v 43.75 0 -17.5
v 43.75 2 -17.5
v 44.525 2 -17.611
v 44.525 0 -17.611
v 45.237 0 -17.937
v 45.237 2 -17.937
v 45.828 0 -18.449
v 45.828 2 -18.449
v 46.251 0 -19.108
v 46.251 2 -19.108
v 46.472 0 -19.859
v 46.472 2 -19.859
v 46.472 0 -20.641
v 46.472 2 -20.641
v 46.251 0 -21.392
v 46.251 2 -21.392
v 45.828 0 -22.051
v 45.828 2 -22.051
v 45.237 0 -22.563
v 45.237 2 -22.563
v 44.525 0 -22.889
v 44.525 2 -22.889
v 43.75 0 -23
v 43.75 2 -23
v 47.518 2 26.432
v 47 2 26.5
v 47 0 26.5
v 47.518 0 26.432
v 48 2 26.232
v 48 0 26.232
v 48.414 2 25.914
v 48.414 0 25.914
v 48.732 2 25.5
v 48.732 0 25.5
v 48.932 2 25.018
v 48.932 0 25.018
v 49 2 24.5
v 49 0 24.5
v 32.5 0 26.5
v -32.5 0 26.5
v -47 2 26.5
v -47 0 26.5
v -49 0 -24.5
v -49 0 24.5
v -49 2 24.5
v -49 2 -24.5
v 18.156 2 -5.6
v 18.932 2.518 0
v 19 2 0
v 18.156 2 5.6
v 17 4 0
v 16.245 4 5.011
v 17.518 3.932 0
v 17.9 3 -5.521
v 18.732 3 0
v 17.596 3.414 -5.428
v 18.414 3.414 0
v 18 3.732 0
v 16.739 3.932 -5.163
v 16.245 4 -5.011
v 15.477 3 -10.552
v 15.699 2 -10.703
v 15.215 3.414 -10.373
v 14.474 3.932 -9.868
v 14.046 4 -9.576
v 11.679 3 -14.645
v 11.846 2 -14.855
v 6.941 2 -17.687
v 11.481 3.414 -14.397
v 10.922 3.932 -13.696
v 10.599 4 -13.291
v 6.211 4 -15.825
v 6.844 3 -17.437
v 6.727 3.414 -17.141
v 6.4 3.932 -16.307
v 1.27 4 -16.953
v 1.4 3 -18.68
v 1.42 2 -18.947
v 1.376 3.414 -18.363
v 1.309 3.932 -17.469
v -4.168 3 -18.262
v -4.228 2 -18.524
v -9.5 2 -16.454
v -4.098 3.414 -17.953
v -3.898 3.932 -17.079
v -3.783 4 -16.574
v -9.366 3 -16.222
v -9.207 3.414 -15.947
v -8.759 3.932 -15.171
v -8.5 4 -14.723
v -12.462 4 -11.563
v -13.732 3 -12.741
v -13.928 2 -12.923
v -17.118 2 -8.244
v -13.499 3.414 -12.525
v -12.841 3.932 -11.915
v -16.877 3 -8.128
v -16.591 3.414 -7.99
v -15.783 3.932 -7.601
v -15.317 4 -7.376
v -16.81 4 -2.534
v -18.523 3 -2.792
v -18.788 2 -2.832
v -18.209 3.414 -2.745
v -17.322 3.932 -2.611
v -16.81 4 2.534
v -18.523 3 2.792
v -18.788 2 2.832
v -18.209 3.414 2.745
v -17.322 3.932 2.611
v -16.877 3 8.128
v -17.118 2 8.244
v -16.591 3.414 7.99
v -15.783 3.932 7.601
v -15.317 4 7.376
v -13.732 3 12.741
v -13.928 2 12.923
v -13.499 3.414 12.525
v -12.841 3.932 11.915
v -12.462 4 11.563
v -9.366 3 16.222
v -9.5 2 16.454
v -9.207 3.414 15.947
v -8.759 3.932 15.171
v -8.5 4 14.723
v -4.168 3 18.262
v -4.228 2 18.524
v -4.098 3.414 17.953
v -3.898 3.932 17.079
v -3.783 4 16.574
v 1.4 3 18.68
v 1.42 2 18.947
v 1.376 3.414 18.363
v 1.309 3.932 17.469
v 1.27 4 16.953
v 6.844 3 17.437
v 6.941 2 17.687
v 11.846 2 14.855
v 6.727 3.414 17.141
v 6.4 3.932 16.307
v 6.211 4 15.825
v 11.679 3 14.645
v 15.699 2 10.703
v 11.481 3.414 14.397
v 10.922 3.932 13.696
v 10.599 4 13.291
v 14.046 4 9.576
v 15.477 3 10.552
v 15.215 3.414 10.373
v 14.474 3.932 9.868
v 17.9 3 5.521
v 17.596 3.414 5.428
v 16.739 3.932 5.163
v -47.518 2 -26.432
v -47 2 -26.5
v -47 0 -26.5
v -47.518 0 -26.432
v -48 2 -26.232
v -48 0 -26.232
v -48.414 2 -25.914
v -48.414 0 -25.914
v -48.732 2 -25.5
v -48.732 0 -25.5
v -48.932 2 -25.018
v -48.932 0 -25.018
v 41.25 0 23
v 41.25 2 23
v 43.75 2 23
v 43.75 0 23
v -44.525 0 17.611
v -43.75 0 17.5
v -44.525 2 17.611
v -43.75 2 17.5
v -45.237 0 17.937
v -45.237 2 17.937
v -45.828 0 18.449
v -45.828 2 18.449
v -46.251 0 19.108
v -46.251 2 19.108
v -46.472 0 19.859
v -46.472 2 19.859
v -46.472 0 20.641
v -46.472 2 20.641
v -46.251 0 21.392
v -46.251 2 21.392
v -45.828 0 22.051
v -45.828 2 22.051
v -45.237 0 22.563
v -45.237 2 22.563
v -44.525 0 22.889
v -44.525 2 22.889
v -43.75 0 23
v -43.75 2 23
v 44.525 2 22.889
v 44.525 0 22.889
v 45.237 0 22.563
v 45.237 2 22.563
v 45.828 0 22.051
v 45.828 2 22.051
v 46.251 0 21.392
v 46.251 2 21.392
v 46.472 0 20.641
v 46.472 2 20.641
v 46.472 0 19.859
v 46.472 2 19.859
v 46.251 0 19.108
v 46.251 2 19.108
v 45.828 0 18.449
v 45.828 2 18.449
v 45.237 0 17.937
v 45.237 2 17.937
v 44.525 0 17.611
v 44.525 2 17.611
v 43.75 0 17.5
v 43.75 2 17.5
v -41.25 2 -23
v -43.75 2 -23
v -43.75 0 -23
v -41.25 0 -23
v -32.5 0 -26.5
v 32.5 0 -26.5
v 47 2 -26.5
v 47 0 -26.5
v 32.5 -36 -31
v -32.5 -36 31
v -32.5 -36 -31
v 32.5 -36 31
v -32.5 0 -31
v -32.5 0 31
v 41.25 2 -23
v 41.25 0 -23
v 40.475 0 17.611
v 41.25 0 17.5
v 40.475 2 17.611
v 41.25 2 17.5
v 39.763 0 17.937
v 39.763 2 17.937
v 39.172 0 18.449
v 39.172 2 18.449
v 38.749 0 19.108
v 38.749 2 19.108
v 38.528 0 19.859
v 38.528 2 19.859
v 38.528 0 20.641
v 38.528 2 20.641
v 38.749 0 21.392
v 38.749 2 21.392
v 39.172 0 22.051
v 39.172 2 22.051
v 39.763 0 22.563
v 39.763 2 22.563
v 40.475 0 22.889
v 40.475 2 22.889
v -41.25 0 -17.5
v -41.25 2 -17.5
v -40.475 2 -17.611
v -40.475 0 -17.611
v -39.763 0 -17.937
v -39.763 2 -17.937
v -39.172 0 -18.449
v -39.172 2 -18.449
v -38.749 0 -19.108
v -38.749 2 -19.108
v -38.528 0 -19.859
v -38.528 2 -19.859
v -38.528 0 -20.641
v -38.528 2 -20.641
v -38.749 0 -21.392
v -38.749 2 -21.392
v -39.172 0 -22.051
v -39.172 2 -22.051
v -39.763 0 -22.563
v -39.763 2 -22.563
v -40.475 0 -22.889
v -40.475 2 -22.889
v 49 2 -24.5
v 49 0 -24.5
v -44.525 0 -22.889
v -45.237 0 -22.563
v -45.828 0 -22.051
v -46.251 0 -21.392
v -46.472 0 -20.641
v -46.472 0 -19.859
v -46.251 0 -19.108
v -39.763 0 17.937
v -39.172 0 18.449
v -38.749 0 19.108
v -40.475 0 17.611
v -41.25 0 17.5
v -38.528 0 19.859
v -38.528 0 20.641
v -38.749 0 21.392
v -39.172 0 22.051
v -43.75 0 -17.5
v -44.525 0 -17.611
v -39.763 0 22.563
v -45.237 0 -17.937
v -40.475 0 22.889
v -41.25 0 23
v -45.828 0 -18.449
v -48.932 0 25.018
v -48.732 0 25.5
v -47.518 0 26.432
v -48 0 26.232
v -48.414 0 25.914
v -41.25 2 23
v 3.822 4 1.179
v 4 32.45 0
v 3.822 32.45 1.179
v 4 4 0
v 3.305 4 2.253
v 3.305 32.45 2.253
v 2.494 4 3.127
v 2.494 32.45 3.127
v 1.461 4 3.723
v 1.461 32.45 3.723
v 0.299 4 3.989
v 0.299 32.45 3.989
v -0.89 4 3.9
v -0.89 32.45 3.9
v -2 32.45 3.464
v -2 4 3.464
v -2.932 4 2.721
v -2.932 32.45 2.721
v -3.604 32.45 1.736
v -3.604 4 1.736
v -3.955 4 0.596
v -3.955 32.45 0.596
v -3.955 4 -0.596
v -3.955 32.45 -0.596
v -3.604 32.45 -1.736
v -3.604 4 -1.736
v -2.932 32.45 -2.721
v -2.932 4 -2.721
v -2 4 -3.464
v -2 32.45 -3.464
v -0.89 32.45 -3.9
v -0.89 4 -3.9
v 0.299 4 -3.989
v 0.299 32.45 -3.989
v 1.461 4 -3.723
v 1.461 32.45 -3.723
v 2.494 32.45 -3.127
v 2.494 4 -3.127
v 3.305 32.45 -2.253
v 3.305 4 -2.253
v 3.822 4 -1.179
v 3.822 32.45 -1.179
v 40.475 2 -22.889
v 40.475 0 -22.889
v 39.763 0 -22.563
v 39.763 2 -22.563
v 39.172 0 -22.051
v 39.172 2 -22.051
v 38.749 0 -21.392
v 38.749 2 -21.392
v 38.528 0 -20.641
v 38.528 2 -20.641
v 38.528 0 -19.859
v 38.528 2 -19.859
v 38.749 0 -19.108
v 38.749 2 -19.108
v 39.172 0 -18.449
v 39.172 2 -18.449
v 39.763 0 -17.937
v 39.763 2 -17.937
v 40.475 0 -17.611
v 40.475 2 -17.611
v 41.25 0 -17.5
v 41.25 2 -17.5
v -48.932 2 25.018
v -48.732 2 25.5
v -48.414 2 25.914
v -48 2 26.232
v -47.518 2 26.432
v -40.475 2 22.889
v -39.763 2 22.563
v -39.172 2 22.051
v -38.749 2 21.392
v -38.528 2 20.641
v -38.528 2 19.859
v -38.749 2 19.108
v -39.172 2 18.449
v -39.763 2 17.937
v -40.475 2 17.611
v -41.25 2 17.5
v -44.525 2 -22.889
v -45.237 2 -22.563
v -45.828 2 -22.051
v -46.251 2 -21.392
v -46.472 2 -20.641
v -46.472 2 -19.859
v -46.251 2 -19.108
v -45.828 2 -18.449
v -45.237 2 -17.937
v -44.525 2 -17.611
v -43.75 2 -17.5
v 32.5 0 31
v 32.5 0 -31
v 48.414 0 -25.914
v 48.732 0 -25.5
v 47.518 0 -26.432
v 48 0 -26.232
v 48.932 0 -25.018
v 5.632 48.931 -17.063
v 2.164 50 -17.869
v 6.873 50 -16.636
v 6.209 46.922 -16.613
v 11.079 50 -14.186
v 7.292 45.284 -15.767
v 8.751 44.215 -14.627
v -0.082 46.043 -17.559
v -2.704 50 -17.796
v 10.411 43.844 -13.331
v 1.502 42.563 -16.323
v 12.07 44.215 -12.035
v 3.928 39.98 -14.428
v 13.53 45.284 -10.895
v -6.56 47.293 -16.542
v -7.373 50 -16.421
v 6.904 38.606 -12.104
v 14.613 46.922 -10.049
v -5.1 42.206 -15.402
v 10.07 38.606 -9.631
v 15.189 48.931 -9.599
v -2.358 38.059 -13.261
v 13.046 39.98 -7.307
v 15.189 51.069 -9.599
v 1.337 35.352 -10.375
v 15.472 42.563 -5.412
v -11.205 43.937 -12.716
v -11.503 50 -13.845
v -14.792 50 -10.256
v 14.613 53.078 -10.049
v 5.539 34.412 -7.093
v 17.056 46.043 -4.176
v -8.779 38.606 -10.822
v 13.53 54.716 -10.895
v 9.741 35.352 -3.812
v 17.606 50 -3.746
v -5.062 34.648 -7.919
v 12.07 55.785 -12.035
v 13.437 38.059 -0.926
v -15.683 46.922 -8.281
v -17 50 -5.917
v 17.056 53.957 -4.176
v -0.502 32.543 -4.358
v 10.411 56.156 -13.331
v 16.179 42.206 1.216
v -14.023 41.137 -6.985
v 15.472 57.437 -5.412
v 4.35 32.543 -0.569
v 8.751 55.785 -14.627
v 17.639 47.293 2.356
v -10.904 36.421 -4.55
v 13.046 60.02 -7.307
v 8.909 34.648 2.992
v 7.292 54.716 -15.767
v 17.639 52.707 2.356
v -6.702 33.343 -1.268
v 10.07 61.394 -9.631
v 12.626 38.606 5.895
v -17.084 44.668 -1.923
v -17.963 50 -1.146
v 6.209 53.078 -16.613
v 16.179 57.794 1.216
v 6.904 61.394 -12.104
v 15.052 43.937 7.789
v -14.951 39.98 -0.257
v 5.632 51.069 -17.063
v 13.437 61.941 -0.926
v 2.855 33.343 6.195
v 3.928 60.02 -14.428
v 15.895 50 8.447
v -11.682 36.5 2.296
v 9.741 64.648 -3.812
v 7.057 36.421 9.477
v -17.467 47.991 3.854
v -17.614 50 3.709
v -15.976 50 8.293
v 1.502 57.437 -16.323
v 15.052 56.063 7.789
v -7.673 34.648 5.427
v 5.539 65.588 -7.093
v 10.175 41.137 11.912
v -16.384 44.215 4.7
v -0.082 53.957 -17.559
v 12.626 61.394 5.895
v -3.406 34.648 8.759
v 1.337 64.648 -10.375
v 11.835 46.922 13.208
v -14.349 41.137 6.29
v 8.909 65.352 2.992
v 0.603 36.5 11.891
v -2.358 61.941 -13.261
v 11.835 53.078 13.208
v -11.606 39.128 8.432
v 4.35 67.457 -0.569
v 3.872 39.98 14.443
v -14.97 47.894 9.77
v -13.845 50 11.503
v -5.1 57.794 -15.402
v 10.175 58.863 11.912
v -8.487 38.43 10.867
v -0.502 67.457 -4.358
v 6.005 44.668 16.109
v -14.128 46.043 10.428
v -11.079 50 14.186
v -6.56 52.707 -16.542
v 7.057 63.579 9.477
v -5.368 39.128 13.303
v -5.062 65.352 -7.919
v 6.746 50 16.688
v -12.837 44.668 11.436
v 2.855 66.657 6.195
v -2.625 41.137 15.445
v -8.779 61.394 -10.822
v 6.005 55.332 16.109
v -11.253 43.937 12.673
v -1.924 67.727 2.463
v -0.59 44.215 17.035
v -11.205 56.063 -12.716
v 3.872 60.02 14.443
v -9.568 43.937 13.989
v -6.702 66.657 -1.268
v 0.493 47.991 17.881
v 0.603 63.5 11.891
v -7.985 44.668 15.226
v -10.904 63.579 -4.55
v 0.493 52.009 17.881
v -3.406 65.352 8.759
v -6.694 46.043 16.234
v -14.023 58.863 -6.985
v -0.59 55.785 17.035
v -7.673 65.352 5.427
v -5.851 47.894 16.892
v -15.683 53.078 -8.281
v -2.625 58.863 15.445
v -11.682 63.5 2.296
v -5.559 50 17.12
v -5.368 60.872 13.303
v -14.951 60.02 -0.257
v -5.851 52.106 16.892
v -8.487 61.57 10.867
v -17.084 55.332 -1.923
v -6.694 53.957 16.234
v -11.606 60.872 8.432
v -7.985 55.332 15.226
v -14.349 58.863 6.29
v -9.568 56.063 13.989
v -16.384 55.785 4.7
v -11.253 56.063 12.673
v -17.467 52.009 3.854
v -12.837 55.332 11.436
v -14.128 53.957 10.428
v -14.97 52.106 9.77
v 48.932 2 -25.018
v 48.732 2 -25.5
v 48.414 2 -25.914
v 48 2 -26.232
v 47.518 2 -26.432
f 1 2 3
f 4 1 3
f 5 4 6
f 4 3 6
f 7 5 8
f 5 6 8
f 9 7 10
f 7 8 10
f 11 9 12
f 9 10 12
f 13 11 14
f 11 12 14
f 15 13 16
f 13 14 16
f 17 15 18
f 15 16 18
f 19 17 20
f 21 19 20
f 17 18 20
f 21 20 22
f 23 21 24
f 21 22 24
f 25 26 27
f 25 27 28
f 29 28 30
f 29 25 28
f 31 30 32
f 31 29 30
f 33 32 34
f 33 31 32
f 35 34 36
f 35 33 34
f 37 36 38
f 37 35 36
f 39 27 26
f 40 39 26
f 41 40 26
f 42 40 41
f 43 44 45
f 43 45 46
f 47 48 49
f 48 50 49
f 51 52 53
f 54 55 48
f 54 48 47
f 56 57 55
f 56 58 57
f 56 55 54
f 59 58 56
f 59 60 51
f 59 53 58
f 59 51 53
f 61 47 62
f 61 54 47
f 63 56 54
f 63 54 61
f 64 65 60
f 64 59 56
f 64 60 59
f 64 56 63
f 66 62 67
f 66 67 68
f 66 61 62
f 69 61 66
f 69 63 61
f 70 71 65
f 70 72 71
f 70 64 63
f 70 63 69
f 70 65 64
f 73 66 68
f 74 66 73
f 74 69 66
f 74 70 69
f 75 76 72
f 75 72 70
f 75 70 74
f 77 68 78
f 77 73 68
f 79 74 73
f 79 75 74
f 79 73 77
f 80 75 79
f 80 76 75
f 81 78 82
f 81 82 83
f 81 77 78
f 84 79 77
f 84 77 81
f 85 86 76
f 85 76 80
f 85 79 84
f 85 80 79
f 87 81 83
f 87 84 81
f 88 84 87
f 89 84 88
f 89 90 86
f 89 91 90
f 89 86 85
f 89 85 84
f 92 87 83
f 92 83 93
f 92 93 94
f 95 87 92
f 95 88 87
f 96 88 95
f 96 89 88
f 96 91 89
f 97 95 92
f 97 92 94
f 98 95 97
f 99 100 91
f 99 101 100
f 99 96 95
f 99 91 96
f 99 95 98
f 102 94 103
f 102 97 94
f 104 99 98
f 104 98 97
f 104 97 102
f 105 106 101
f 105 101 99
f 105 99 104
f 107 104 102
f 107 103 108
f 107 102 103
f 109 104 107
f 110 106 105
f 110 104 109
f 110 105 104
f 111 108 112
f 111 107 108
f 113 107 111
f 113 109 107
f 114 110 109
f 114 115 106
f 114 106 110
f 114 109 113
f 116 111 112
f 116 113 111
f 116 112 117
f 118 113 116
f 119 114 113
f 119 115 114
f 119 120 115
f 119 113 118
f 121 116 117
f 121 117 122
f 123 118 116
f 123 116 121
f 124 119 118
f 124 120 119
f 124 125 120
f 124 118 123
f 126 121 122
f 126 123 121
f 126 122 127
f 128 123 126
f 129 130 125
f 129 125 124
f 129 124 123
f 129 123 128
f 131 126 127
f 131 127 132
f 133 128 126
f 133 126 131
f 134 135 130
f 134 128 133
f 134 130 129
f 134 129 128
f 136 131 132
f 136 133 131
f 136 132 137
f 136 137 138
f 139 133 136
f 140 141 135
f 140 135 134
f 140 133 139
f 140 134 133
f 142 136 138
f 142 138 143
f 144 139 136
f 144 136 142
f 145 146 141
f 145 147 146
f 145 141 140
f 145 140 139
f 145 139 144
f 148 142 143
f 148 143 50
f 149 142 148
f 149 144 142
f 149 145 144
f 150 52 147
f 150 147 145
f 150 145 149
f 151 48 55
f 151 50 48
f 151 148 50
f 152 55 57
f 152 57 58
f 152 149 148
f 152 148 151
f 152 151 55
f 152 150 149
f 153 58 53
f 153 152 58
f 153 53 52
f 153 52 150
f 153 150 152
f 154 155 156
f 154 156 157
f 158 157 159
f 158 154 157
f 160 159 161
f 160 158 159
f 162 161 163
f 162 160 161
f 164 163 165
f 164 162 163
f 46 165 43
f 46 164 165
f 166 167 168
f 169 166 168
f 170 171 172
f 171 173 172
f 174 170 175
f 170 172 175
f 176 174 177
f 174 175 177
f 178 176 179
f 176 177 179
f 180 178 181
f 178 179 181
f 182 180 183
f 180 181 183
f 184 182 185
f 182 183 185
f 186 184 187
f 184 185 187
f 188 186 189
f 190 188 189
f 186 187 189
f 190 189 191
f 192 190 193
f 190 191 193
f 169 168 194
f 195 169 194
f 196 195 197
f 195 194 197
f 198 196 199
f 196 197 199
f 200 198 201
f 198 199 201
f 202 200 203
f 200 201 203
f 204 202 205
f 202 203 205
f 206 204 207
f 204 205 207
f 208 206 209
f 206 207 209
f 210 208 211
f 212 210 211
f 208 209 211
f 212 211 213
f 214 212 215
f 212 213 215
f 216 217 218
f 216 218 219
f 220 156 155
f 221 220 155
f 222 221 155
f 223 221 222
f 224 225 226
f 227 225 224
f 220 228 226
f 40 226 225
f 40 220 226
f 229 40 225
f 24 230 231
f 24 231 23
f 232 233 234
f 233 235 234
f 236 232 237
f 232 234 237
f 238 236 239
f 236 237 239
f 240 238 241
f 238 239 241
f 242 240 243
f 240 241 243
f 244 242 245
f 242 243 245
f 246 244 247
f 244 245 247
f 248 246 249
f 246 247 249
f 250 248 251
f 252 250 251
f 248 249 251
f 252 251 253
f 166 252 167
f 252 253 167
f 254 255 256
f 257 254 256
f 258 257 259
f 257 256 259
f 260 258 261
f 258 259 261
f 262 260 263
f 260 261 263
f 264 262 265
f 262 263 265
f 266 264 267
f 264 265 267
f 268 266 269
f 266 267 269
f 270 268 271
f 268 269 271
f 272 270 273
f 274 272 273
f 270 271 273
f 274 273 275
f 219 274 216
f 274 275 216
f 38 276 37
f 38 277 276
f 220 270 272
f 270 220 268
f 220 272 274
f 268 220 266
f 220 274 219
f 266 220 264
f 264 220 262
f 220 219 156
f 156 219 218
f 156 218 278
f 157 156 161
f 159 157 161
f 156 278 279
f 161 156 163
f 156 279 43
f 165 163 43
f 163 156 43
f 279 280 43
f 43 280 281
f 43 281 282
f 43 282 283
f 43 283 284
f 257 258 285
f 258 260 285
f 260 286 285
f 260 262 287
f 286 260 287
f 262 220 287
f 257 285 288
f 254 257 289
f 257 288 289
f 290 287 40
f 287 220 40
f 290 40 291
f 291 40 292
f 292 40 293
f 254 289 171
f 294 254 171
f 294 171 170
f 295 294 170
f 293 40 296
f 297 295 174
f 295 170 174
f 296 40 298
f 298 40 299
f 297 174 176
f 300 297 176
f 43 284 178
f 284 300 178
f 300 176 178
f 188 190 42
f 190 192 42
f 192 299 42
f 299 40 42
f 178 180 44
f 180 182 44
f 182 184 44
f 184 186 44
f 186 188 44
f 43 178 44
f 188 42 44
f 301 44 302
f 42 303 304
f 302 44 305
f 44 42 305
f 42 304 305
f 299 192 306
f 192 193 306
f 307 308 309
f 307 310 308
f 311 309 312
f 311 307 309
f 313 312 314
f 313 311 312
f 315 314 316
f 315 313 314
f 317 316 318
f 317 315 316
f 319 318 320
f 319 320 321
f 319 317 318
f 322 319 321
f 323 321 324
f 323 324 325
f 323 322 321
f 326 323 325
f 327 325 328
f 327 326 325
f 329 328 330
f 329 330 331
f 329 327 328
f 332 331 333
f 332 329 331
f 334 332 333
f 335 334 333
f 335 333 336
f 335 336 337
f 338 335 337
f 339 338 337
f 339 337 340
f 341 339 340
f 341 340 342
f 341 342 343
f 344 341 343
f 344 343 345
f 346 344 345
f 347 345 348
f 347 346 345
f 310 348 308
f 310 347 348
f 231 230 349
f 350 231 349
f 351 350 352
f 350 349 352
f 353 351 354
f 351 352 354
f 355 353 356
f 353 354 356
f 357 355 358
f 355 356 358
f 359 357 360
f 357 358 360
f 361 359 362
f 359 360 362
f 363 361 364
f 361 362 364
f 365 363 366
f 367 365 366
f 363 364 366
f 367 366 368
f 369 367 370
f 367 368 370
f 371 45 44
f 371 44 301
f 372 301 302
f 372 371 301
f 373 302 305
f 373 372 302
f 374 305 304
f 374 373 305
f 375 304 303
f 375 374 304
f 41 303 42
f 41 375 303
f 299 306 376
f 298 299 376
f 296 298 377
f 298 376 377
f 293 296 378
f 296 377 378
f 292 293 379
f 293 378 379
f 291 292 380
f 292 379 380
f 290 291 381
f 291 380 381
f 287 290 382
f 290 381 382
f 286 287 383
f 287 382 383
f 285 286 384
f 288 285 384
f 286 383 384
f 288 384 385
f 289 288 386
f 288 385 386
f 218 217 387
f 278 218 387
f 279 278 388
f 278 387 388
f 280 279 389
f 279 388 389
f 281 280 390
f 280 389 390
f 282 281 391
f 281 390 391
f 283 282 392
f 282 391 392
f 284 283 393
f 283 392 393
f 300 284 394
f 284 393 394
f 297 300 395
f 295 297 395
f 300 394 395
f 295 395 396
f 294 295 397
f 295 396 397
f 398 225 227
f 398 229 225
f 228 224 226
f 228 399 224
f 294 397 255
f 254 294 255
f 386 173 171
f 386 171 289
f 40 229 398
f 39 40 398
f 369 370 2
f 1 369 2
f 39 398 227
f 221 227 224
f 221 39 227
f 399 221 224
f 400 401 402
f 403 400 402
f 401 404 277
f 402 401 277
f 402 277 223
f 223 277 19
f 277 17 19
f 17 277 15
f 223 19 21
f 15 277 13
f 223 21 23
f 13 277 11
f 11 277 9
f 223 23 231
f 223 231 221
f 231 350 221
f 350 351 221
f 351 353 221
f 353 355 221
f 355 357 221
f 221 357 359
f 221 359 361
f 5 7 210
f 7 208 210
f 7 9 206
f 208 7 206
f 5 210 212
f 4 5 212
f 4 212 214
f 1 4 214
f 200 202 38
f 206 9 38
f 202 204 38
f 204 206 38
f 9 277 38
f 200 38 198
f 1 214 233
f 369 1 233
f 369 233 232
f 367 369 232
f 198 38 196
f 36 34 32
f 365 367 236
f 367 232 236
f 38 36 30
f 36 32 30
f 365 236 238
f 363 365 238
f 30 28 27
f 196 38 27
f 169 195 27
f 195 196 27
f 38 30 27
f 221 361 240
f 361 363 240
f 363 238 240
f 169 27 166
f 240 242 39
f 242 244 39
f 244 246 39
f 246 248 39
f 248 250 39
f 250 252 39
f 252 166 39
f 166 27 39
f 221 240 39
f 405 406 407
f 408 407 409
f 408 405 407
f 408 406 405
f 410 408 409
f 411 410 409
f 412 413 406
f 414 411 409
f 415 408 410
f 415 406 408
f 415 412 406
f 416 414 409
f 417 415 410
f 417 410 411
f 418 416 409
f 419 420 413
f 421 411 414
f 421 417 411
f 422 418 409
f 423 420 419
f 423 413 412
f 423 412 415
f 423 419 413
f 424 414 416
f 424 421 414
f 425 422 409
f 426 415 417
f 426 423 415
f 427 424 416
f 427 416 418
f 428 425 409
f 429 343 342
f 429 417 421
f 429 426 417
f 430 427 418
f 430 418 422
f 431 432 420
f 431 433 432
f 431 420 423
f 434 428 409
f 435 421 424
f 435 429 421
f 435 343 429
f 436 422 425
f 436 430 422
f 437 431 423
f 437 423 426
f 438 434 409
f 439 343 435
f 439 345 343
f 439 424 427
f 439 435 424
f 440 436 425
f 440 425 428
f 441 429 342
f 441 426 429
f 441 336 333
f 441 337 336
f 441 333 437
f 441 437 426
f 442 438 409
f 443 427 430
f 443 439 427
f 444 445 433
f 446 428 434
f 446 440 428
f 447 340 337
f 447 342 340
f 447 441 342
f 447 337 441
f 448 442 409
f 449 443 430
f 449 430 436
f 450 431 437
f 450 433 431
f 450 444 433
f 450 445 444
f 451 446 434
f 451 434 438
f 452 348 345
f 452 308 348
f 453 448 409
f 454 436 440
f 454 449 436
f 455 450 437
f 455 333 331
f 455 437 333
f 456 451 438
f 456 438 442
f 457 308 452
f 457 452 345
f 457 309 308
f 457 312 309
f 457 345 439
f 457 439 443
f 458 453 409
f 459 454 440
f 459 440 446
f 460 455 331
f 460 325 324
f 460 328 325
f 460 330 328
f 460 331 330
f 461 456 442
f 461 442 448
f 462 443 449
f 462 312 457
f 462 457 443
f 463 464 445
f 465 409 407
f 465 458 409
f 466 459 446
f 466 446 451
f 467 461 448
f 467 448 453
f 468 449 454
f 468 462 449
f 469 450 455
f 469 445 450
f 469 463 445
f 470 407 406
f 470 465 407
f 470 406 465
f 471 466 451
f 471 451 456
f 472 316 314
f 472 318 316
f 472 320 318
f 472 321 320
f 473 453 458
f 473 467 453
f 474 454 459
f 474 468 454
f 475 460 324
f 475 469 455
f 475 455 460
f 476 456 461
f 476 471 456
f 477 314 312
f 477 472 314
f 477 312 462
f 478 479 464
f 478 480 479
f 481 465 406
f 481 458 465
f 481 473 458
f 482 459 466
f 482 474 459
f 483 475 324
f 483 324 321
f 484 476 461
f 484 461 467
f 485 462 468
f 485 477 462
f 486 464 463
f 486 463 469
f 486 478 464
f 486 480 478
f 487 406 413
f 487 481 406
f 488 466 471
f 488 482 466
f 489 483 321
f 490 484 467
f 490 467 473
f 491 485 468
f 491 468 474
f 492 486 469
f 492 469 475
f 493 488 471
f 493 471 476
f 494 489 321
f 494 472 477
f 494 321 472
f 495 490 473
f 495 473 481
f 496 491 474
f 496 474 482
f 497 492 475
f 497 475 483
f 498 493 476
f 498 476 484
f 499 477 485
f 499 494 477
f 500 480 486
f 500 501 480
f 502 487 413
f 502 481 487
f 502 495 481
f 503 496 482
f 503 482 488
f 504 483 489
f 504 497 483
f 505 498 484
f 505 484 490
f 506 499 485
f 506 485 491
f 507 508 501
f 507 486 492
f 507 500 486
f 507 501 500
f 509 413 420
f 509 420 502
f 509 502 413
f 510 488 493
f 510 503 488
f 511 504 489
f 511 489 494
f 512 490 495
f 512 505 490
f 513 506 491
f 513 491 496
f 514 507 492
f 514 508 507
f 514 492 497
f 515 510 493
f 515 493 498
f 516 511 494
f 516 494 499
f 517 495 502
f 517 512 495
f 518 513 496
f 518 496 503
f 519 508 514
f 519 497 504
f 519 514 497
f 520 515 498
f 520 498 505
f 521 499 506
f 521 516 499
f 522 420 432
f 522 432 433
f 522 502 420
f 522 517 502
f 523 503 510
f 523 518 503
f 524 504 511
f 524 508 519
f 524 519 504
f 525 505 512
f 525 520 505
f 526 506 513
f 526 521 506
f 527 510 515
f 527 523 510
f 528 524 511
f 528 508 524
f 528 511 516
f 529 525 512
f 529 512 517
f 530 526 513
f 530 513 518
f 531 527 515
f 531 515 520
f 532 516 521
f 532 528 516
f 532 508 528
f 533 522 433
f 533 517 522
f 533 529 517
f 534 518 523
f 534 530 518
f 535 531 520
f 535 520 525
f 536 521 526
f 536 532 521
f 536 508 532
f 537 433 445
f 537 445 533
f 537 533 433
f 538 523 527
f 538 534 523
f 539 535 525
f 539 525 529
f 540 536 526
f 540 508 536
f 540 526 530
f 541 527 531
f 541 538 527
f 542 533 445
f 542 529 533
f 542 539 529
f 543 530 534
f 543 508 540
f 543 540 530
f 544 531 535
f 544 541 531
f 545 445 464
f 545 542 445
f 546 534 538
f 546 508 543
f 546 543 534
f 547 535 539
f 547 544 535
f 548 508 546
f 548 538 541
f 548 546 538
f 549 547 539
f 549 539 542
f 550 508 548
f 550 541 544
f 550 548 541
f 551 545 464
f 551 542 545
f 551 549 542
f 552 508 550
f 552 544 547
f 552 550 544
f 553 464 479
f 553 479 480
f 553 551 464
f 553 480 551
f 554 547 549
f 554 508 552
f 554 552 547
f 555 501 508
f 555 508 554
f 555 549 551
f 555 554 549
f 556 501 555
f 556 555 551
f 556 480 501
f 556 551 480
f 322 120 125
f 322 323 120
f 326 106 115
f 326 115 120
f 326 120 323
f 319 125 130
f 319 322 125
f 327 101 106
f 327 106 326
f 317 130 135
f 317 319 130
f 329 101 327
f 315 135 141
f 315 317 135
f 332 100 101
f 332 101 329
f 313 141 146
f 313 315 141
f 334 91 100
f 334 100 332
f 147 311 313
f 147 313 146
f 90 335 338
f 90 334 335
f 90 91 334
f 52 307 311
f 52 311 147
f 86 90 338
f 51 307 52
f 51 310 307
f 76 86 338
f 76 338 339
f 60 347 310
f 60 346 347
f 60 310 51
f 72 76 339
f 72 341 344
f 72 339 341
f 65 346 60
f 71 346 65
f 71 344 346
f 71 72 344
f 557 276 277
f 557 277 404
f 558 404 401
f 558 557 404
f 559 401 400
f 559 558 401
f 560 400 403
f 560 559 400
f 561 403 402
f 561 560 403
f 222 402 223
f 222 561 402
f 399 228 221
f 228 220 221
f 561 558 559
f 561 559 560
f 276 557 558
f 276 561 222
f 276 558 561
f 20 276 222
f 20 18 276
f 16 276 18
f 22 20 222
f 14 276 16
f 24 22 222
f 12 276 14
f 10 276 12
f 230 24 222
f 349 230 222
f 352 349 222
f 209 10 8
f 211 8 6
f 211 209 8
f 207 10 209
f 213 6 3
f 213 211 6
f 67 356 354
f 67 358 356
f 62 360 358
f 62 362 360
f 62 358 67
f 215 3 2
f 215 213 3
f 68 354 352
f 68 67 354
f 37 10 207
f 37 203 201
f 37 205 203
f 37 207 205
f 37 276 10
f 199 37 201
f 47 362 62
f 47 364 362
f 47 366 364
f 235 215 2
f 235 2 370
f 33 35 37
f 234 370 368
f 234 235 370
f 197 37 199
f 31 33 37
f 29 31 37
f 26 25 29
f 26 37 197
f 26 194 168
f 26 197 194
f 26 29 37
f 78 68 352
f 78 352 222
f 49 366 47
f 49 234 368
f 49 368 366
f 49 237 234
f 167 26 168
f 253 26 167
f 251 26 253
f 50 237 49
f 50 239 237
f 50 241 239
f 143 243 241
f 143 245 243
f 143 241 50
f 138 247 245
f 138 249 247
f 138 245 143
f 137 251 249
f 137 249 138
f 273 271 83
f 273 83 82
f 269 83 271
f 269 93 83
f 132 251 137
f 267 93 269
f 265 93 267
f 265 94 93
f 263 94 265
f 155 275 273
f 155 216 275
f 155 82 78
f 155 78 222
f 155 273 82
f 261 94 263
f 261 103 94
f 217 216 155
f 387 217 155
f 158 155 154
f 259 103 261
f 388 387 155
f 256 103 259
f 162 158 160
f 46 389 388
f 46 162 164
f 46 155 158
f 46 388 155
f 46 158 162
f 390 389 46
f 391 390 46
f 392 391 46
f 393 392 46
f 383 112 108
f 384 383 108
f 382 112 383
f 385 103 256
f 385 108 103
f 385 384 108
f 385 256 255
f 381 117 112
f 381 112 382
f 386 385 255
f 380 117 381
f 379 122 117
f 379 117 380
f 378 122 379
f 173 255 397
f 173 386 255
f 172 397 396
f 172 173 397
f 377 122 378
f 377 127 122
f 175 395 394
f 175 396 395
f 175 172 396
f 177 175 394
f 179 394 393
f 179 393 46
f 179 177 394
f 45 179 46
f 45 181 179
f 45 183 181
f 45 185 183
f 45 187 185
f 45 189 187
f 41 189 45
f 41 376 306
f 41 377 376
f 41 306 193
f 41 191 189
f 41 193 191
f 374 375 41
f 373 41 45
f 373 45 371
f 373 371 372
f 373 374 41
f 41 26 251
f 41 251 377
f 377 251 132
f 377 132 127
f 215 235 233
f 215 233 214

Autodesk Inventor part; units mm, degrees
ref_plane "YZ Plane" through (0, 0, 0) normal (1, 0, 0) x (0, 1, 0)
ref_plane "XZ Plane" through (0, 0, 0) normal (0, 1, 0) x (-1, 0, 0)
ref_plane "XY Plane" through (0, 0, 0) normal (0, 0, 1) x (1, 0, 0)
sketch "Sketch2" plane through (0, 0, 0) normal (0, 1, 0) x (-1, 0, 0)
  line L0 (-49, 26.5) -> (49, 26.5)
  line L1 (49, 26.5) -> (49, -26.5)
  line L2 (49, -26.5) -> (-49, -26.5)
  line L3 (-49, -26.5) -> (-49, 26.5)
  point P0 (0, 0)
  point P1 (0, -26.5)
  point P2 (49, 0)
  dimension "d5" = 98
  dimension "d7" = 53
extrude "Extrusion1" add sketch "Sketch2" along normal blind 2
sketch "Sketch3" plane through (0, 2, 0) normal (0, 1, 0) x (1, 0, 0)
  line L0 (-49, -26.5) -> (49, -26.5) projected
  line L1 (49, -26.5) -> (49, 26.5) projected
  line L2 (49, 26.5) -> (-49, 26.5) projected
  line L3 (-49, 26.5) -> (-49, -26.5) projected
  arc A0 (43.75, 17.5) -> (43.75, 23) centre (43.75, 20.25) ccw
  arc A1 (41.25, 23) -> (41.25, 17.5) centre (41.25, 20.25) ccw
  line L4 (41.25, 23) -> (43.75, 23)
  line L5 (41.25, 17.5) -> (43.75, 17.5)
  arc A2 (-41.25, 17.5) -> (-41.25, 23) centre (-41.25, 20.25) ccw
  arc A3 (-43.75, 23) -> (-43.75, 17.5) centre (-43.75, 20.25) ccw
  line L6 (-43.75, 23) -> (-41.25, 23)
  line L7 (-43.75, 17.5) -> (-41.25, 17.5)
  arc A4 (43.75, -23) -> (43.75, -17.5) centre (43.75, -20.25) ccw
  arc A5 (41.25, -17.5) -> (41.25, -23) centre (41.25, -20.25) ccw
  line L8 (41.25, -17.5) -> (43.75, -17.5)
  line L9 (41.25, -23) -> (43.75, -23)
  arc A6 (-41.25, -23) -> (-41.25, -17.5) centre (-41.25, -20.25) ccw
  arc A7 (-43.75, -17.5) -> (-43.75, -23) centre (-43.75, -20.25) ccw
  line L10 (-43.75, -17.5) -> (-41.25, -17.5)
  line L11 (-43.75, -23) -> (-41.25, -23)
  point P0 (0, 0)
  dimension "d10" = 5.5
  dimension "d13" = 2.5
  dimension "d14" = 20.25
  dimension "d15" = 41.25
  dimension "d20" = 85
  dimension "d23" = 40.5
extrude "Extrusion4" cut sketch "Sketch3" against normal blind 2 keep common part
sketch "Sketch4" plane through (0, 2, 0) normal (0, 1, 0) x (1, 0, 0)
  circle A0 centre (0, 0) radius 19
  dimension "d30" = 38
extrude "Extrusion5" add sketch "Sketch4" along normal blind 2
sketch "Sketch5" plane through (0, 4, 0) normal (0, 1, 0) x (1, 0, 0)
  circle A0 centre (0, 0) radius 19 projected
  circle A1 centre (0, 0) radius 4
  dimension "d34" = 8
extrude "Extrusion6" add sketch "Sketch5" along normal blind 46 contours A1
sketch "Sketch6" plane through (0, 0, 0) normal (0, -1, 0) x (1, 0, 0)
  line L0 (-32.5, 31) -> (32.5, 31)
  line L1 (32.5, 31) -> (32.5, -31)
  line L2 (32.5, -31) -> (-32.5, -31)
  line L3 (-32.5, -31) -> (-32.5, 31)
  point P0 (0, 0)
  point P1 (0, 31)
  point P2 (-32.5, 0)
  dimension "d39" = 65
  dimension "d42" = 62
extrude "Extrusion7" add sketch "Sketch6" along normal blind 36
sketch "Sketch7" plane through (0, 50, 0) normal (0, 1, 0) x (1, 0, 0)
  circle A0 centre (0, 0) radius 4 projected
  circle A1 centre (0, 0) radius 18
  line L0 (11.079, 14.1865) -> (-11.079, -14.1865)
  dimension "d46" = 36
revolve "Revolution1" add sketch "Sketch7" angle 360 about axis through (11.079, 50, -14.1865) along (-0.6154984, 0, 0.7881381) picked at (-1.4546, 2.0706) picked at (6.9677, 11.2549) contours L0 A0 | A0 L0 A1
fillet "Fillet1" radius 2 1 edges at (49, 1, 26.5)
fillet "Fillet2" radius 2 1 edges at (49, 1, -26.5)
fillet "Fillet3" radius 2 1 edges at (-49, 1, -26.5)
fillet "Fillet4" radius 2 1 edges at (-49, 1, 26.5)
fillet "Fillet5" radius 2 1 edges at (-19, 4, 0)
equation "\"BendRadius\" = Thickness"
equation "\"BendReliefWidth\" = Thickness"
equation "\"BendReliefDepth\" = 0.5 * Thickness"
equation "\"CornerReliefSize\" = 4 * Thickness"
equation "\"MinimumRemnant\" = 2 * Thickness"
equation "\"TransitionRadius\" = BendRadius"
equation "\"JacobiRadiusSize\" = Thickness"
equation "\"GapSize\" = Thickness"
equation "\"Thickness\" = 0.5"
properties part number "Sanwa_Joystick_JLF-TP-8YT"
